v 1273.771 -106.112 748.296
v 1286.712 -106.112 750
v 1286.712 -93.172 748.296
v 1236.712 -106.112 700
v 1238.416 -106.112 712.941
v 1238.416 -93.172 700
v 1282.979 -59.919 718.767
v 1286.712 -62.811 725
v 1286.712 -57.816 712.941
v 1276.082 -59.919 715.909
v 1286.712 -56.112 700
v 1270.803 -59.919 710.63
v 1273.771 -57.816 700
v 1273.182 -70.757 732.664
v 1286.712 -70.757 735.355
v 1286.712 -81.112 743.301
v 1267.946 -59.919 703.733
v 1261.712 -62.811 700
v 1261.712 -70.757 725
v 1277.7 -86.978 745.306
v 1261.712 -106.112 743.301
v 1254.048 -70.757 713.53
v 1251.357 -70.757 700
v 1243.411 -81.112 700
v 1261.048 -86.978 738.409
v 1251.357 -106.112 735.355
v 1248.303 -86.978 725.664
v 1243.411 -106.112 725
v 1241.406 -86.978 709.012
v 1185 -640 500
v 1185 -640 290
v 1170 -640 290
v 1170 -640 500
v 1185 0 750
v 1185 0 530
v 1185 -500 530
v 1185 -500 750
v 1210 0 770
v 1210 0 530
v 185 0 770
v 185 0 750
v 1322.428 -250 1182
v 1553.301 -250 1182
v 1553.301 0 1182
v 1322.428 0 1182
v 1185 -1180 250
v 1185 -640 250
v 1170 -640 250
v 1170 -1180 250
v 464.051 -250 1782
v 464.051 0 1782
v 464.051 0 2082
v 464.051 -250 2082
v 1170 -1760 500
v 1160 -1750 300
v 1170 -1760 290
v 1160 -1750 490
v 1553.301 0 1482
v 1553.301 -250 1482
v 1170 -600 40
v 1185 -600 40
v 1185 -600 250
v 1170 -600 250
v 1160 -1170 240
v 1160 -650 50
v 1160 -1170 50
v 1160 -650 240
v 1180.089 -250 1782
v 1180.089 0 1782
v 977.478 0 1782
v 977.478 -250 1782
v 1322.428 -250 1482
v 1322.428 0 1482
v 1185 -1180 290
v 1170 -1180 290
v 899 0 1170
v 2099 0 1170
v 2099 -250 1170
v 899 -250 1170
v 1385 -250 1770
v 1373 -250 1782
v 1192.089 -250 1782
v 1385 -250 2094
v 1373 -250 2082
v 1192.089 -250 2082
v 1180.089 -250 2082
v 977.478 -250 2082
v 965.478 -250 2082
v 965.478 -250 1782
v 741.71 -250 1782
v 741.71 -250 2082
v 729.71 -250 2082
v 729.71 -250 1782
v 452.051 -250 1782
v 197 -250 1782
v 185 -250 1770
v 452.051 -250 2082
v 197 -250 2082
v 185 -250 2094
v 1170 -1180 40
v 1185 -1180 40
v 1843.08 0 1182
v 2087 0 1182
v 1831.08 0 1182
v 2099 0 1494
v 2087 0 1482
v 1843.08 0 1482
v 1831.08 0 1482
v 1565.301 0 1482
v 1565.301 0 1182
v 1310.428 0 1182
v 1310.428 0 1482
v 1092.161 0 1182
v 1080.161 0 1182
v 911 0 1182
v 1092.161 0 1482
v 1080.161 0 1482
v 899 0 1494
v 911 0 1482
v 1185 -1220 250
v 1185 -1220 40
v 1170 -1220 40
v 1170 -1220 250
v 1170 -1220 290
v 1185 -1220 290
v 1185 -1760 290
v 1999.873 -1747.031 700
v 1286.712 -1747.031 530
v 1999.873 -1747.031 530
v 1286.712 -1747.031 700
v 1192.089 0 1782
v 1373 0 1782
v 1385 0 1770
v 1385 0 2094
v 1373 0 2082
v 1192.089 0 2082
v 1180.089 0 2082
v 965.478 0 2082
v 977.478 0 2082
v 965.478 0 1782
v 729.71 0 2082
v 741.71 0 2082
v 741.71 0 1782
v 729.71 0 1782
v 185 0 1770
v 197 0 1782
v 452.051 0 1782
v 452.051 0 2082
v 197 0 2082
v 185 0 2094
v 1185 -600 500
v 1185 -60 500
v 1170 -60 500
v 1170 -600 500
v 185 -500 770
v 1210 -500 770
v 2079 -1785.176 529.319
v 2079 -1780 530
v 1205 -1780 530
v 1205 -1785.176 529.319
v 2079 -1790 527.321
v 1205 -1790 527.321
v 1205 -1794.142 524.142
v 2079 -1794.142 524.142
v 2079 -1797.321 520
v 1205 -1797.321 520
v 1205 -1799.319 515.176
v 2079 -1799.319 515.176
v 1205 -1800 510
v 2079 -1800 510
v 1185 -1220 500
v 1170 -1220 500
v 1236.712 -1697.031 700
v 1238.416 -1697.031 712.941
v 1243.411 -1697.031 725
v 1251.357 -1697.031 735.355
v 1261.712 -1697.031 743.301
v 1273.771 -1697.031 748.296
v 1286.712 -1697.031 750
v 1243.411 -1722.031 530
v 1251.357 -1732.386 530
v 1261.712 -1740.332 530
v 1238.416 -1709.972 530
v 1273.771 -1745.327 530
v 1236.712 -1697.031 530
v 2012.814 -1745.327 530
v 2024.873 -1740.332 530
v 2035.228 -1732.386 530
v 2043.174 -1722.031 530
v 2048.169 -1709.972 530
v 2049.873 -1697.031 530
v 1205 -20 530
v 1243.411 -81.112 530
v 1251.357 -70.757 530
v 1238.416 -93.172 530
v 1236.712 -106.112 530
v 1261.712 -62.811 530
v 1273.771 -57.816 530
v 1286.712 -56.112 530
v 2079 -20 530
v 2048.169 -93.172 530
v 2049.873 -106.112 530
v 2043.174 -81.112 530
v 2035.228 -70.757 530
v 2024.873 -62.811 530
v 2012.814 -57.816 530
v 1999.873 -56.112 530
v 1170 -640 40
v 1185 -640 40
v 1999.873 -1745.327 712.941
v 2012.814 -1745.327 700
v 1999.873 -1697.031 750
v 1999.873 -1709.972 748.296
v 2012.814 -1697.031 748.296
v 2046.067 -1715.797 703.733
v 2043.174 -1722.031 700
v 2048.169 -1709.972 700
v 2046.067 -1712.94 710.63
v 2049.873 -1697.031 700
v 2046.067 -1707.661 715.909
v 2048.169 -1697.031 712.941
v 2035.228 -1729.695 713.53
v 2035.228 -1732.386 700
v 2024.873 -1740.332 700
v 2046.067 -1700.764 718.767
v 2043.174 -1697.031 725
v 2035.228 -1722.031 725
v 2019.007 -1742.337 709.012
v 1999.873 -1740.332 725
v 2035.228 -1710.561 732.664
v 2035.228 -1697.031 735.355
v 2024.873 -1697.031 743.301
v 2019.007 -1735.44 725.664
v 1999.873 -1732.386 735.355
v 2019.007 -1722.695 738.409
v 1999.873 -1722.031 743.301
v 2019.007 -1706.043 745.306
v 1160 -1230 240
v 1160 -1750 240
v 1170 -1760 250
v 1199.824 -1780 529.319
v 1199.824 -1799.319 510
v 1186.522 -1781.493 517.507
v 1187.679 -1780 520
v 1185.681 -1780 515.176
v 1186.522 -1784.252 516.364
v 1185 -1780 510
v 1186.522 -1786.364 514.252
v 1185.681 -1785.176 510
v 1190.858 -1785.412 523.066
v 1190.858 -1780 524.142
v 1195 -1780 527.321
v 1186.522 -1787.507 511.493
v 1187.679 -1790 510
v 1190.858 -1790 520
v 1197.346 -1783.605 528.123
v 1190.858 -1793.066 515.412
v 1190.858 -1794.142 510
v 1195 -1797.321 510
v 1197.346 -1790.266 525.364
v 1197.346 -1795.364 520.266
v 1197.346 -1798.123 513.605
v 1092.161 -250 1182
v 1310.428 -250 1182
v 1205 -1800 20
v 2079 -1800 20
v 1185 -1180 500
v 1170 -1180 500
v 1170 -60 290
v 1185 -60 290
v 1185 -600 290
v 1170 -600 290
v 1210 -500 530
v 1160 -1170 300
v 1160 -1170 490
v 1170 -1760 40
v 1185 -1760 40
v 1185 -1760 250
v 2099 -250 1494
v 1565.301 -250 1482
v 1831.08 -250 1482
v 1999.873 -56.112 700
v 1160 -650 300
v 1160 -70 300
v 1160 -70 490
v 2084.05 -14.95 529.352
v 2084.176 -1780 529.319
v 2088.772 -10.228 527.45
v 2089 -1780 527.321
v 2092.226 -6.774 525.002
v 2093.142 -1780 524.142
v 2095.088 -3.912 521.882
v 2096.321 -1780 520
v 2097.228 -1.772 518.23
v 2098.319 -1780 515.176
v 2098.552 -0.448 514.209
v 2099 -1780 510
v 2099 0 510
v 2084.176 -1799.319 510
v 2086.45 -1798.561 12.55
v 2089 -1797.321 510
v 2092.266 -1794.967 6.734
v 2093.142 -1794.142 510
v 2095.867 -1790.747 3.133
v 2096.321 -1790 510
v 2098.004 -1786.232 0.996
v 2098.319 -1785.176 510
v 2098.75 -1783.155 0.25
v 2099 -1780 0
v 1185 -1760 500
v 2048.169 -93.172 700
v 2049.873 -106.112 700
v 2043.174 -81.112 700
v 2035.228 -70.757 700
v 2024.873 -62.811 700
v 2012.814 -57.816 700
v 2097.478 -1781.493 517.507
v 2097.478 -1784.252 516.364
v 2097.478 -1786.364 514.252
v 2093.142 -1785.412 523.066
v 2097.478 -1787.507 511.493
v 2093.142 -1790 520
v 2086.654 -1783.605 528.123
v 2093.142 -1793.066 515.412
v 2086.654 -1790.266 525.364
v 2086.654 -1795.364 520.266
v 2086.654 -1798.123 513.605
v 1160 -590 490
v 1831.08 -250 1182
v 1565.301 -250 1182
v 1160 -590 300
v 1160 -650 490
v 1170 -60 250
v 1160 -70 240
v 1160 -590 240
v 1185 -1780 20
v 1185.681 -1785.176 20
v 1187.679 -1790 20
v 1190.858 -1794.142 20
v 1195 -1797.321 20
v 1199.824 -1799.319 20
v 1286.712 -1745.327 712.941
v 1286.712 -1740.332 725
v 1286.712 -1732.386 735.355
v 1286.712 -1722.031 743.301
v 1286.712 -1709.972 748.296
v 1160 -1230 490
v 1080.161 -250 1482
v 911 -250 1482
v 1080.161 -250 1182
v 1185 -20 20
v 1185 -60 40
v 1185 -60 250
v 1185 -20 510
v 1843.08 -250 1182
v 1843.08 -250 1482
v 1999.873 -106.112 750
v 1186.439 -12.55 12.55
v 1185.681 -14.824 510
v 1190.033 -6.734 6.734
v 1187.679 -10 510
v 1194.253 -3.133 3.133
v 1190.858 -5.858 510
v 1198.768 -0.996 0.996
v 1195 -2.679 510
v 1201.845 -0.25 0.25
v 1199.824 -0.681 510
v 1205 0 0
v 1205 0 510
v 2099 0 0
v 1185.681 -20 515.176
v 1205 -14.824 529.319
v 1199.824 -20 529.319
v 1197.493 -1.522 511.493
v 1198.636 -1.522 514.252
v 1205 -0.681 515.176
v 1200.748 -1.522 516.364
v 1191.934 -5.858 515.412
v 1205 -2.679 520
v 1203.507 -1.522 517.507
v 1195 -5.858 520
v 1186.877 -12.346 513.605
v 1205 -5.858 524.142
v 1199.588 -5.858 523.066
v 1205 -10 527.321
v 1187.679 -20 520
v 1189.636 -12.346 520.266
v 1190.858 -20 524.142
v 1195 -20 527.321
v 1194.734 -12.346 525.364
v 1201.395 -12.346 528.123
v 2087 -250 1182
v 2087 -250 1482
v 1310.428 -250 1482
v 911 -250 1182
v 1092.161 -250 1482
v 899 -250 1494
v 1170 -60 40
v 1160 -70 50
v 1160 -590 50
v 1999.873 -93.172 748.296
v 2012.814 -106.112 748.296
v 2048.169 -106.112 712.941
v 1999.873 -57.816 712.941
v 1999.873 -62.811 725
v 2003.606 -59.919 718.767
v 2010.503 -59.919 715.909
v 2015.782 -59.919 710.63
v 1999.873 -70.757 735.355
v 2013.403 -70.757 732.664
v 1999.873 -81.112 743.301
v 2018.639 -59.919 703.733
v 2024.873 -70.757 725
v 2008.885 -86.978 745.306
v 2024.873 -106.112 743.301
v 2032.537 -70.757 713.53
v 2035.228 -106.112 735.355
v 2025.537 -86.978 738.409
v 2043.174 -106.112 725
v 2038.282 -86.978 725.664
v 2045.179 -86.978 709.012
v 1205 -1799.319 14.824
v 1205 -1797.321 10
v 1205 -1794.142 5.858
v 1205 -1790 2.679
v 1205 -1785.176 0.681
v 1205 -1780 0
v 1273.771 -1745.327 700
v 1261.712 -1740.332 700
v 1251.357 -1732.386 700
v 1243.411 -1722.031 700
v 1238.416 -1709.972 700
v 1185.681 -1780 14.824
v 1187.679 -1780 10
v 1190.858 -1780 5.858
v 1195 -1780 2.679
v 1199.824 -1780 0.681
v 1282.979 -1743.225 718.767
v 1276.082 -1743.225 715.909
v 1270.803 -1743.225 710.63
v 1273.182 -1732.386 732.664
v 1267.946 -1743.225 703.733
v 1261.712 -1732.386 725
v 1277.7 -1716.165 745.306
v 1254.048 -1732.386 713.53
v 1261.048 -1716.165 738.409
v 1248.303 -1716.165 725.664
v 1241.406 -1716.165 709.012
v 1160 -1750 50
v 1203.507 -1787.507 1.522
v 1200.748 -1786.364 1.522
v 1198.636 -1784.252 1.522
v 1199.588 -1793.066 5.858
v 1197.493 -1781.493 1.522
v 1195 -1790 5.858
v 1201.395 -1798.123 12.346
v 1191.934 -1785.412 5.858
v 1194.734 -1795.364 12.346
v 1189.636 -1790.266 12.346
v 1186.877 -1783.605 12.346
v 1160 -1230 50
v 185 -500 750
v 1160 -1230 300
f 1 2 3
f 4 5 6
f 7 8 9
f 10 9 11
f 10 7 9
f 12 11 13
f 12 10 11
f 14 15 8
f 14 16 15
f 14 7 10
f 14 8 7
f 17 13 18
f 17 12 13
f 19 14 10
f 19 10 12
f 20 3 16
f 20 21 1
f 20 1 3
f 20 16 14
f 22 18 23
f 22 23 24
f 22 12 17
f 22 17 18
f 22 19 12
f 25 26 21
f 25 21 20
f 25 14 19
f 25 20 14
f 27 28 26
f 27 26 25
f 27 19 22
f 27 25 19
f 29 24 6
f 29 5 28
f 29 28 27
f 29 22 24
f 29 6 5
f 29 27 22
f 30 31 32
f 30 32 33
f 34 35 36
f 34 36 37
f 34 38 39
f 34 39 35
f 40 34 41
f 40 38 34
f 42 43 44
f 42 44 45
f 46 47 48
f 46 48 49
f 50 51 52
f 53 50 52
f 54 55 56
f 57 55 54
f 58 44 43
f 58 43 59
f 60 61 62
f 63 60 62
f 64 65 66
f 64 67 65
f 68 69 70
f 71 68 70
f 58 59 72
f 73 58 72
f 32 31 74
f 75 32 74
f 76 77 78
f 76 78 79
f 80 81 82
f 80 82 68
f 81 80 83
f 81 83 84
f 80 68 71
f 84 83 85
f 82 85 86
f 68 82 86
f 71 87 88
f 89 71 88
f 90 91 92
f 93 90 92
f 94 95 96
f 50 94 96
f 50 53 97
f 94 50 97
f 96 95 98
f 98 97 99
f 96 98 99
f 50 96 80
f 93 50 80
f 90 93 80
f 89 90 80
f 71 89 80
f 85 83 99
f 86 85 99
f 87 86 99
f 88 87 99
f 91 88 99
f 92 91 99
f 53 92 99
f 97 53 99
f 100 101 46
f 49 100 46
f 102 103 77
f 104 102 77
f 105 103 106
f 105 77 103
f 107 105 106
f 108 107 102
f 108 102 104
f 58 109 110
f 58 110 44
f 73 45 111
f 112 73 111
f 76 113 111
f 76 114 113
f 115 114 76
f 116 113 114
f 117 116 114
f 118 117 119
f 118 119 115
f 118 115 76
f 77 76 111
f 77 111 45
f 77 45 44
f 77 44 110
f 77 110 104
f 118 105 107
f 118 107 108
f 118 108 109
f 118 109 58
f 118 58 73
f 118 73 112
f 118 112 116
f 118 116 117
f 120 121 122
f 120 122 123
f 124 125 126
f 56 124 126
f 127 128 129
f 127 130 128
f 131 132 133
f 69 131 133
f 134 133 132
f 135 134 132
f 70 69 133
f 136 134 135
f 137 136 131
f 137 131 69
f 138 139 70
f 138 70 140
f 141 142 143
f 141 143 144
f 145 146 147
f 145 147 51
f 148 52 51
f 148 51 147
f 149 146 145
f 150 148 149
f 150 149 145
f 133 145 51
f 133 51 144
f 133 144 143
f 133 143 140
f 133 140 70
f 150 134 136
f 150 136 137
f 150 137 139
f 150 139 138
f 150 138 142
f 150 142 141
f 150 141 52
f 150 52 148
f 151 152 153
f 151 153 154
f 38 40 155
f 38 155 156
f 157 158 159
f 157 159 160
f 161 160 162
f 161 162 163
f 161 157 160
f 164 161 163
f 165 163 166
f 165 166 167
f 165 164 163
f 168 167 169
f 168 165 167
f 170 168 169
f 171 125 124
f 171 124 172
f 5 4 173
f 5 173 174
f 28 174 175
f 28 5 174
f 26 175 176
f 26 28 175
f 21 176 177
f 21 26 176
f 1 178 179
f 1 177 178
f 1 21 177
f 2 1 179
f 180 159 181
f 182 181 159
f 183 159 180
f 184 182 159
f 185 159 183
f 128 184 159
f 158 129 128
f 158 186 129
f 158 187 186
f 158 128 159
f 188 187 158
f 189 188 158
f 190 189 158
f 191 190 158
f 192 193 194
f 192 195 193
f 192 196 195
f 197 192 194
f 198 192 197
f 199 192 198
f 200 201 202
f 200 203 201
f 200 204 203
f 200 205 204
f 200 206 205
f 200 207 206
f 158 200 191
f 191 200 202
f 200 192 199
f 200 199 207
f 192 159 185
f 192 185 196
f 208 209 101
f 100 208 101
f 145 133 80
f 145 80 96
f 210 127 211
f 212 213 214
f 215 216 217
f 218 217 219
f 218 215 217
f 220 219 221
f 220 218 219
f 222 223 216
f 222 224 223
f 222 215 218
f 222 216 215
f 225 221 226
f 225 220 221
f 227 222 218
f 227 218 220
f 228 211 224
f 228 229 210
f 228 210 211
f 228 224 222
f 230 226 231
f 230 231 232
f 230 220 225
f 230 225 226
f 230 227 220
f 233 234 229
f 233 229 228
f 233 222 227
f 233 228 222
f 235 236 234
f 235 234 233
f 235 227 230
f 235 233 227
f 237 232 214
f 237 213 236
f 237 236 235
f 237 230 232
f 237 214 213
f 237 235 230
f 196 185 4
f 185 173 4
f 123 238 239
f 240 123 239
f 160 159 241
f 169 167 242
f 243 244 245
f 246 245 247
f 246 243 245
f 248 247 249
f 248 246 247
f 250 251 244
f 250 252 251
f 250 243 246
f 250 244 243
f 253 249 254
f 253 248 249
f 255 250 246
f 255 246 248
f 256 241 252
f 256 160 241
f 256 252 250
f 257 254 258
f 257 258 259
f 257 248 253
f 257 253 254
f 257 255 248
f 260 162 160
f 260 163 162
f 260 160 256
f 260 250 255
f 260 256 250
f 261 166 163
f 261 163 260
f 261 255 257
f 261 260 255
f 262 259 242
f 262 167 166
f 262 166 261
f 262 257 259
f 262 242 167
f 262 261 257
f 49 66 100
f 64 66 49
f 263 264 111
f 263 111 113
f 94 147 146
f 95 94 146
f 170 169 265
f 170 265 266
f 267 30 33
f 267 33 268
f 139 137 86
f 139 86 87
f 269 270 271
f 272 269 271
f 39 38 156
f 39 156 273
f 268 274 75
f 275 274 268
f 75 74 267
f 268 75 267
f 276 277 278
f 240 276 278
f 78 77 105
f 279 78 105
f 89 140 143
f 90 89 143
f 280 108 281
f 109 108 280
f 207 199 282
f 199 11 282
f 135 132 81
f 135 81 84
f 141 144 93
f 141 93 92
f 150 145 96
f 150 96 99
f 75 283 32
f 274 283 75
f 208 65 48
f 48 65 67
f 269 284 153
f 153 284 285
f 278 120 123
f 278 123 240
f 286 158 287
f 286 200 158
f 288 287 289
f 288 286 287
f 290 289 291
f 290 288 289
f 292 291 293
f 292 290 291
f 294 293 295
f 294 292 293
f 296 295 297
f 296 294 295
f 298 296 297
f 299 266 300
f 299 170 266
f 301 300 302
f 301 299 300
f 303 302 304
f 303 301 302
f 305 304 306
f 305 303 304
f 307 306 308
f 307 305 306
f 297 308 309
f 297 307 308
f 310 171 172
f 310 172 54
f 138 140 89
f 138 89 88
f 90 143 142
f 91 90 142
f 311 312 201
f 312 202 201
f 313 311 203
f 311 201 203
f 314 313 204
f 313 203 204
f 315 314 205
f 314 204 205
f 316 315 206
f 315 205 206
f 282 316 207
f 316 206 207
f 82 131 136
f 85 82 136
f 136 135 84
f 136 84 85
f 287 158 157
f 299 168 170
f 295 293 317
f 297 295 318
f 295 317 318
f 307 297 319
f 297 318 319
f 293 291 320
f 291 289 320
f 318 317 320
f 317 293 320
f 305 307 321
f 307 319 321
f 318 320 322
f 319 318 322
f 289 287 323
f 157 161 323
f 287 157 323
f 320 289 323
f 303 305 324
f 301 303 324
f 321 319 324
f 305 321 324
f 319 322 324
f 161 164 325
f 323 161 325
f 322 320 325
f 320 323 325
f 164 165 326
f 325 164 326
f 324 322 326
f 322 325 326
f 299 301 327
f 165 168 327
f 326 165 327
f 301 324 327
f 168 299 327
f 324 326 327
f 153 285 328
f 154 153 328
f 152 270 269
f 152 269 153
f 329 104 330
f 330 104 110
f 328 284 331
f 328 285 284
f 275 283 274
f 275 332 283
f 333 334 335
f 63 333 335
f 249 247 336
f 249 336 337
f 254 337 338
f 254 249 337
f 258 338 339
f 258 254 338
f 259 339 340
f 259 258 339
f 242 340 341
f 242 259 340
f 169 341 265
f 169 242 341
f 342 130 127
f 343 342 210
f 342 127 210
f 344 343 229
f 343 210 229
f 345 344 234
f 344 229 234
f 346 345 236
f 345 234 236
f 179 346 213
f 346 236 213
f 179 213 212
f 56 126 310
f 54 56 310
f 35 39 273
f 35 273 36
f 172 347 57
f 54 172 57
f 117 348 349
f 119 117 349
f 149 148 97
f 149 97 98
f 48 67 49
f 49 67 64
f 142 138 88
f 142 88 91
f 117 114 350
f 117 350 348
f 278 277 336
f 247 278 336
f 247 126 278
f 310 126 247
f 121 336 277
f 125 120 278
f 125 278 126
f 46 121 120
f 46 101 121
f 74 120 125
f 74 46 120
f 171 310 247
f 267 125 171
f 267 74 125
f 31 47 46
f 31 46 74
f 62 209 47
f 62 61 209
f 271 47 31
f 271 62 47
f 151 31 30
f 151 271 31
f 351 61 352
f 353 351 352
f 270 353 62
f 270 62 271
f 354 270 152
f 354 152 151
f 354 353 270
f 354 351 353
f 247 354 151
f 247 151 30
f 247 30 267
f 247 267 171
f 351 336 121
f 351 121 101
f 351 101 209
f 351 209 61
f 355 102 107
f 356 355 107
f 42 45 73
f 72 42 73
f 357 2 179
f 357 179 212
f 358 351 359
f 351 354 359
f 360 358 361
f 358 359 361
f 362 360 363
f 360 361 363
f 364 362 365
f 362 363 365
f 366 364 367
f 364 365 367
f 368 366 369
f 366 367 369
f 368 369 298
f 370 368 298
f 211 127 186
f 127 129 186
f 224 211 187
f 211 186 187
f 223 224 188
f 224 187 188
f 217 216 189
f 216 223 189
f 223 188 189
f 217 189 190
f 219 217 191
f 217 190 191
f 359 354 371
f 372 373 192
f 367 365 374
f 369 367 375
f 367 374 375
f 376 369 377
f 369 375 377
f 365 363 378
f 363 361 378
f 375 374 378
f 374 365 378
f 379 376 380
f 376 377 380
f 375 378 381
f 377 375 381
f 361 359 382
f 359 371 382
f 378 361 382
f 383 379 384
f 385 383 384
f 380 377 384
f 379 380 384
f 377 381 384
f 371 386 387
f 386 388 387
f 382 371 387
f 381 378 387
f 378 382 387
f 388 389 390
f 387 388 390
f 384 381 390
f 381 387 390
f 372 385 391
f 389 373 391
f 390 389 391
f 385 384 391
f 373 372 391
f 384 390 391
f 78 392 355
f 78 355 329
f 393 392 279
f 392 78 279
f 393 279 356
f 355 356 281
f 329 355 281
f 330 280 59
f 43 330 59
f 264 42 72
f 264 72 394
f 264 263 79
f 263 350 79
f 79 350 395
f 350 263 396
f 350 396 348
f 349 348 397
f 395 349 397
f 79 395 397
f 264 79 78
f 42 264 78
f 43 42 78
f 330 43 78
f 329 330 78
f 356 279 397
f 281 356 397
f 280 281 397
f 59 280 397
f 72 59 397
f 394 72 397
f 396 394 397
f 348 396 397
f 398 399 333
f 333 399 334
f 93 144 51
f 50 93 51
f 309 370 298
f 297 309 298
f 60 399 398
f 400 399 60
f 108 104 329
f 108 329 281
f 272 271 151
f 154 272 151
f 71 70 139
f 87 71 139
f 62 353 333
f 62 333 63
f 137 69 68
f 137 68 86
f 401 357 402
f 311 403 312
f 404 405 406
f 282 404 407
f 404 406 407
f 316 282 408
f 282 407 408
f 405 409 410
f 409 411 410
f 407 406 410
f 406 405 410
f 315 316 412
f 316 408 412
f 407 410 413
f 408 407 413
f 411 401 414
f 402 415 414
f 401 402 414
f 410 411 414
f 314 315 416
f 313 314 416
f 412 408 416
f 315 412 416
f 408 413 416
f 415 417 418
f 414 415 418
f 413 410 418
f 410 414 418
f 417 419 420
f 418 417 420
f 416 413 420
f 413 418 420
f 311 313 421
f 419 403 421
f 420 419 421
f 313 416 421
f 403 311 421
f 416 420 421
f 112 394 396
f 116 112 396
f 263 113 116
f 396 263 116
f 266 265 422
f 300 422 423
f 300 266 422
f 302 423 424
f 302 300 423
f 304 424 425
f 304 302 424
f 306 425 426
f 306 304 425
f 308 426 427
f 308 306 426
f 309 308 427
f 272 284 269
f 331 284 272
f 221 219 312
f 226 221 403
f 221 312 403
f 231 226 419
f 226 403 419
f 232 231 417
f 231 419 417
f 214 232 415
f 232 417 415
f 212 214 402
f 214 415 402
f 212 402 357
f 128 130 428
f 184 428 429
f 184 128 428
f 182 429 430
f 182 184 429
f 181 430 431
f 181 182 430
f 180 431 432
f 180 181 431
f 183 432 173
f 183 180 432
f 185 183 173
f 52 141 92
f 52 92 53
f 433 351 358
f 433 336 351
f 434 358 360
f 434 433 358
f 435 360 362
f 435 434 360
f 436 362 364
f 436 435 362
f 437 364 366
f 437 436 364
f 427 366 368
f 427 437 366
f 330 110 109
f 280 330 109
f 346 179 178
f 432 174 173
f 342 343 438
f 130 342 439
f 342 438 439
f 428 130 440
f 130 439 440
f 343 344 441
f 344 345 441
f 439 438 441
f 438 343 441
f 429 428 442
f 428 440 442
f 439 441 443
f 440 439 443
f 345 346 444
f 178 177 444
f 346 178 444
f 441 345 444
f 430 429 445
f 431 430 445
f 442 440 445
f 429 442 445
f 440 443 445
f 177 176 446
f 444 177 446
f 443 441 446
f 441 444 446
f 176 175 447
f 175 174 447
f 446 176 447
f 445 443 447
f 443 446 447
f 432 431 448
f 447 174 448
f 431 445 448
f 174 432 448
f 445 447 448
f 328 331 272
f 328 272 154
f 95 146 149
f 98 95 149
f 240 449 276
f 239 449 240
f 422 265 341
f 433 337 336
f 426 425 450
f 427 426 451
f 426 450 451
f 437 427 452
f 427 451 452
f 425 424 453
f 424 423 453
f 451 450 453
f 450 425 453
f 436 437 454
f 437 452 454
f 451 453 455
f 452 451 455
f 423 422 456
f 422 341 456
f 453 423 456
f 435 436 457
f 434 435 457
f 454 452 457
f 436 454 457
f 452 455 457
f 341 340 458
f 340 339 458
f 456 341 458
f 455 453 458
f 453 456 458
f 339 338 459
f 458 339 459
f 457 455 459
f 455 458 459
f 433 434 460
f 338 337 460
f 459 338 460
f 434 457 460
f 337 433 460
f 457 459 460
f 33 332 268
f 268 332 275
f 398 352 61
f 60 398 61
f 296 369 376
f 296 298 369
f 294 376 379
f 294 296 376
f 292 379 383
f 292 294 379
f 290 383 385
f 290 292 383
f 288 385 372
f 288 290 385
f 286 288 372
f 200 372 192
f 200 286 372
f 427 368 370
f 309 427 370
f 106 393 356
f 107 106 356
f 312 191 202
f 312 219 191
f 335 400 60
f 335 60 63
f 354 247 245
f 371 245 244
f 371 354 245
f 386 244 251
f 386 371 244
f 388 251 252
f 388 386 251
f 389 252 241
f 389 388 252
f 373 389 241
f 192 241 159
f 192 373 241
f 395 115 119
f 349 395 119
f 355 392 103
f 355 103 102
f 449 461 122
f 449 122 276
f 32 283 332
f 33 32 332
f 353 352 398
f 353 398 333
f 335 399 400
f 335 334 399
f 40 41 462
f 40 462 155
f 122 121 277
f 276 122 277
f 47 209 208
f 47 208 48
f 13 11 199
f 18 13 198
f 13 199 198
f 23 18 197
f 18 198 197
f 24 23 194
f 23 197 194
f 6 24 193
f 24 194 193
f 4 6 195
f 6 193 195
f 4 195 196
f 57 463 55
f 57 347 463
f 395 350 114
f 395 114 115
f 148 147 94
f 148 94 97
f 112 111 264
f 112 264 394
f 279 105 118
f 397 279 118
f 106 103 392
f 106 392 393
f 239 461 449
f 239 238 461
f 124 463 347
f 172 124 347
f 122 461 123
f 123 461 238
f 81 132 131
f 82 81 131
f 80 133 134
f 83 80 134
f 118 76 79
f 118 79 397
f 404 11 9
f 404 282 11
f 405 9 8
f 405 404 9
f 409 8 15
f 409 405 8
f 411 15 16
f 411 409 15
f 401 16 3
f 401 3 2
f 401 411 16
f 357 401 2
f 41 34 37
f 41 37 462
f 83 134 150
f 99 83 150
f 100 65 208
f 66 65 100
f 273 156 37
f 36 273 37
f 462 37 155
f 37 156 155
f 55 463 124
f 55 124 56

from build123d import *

# Parameters (mm, degrees)
F0_W      = 914
F0_H      = 750
F1_DEPTH  = 1800
F2_W      = 1000
F2_H      = 20
F3_DEPTH  = 500
F4_W      = 540
F4_H      = 210
F5_DEPTH  = 25
F6_W      = 914
F6_H      = 1800
F6_W_2    = 813.160777092
F6_H_2    = 1690.9182518721
F7_DEPTH  = 220
F8_W      = 1200
F8_H      = 324
F8_W_2    = 243.9199807754
F8_H_2    = 300
F8_W_3    = 265.7794940654
F8_W_4    = 230.8728685812
F8_W_5    = 218.2666818699
F8_W_6    = 169.1609747081
F9_DEPTH  = 250
F8_W_7    = 180.9111001602
F8_W_8    = 202.611290684
F8_W_9    = 223.7679018775
F8_W_10   = 265.6586144133
F8_W_11   = 255.051092865
F10_DEPTH = 25
F11_R     = 20
F12_R     = 50
F13_SIZE  = 10


# Not quite as in the source:
# - a feature names something its author has since deleted; it is built from what else it names


with BuildPart() as f1:
    # F0 (on Front) → F1 (new body)
    with BuildSketch(Plane.XZ):
        with Locations((1642, 375)):
            Rectangle(F0_W, F0_H)
    extrude(amount=F1_DEPTH)

    # F4 (on face) → F5 (join)
    with BuildSketch(Plane(origin=(1185, 0, 0), x_dir=(0, -1, 0), z_dir=(-1, 0, 0))):
        with Locations((1490, 145)):
            Rectangle(F4_W, F4_H)
        with Locations((330, 145)):
            Rectangle(F4_W, F4_H)
        with Locations((910, 145)):
            Rectangle(F4_W, F4_H)
        with Locations((1490, 395)):
            Rectangle(F4_W, F4_H)
        with Locations((330, 395)):
            Rectangle(F4_W, F4_H)
        with Locations((910, 395)):
            Rectangle(F4_W, F4_H)
    extrude(amount=F5_DEPTH)

    # F6 (on face) → F7 (cut)
    with BuildSketch(Plane.XY.offset(750)):
        with Locations((1642, -900)):
            Rectangle(F6_W, F6_H)
        with Locations((1643.2924866676, -901.5716090798)):
            Rectangle(F6_W_2, F6_H_2, mode=Mode.SUBTRACT)
    extrude(amount=-F7_DEPTH, mode=Mode.SUBTRACT)

    # F4 (on face) → F10 (join)
    with BuildSketch(Plane(origin=(1185, 0, 0), x_dir=(0, -1, 0), z_dir=(-1, 0, 0))):
        with Locations((1490, 145)):
            Rectangle(F4_W, F4_H)
        with Locations((330, 145)):
            Rectangle(F4_W, F4_H)
        with Locations((910, 145)):
            Rectangle(F4_W, F4_H)
        with Locations((1490, 395)):
            Rectangle(F4_W, F4_H)
        with Locations((330, 395)):
            Rectangle(F4_W, F4_H)
        with Locations((910, 395)):
            Rectangle(F4_W, F4_H)
    extrude(amount=F10_DEPTH)

    # F11
    f11_edges = [f1.edges().sort_by_distance(p)[0] for p in [
        (1642, -1800, 530),
        (1185, -900, 530),
        (1185, -1800, 265),
        (1185, 0, 265),
        (1642, 0, 530),
        (1642, -1800, 0),
        (1185, -900, 0),
        (2099, -900, 530),
        (2099, -1800, 265),
    ]]
    fillet(f11_edges, radius=F11_R)

    # F12
    f12_edges = [f1.edges().sort_by_distance(p)[0] for p in [
        (1236.712098, -901.571609, 750),
        (1643.292487, -1747.030735, 750),
        (1236.712098, -1747.030735, 640),
        (2049.872875, -1747.030735, 640),
        (2049.872875, -901.571609, 750),
        (1643.292487, -56.112483, 750),
        (2049.872875, -56.112483, 640),
        (1236.712098, -56.112483, 640),
    ]]
    fillet(f12_edges, radius=F12_R)

    # F13
    f13_edges = [f1.edges().sort_by_distance(p)[0] for p in [
        (1160, -330, 290),
        (1160, -600, 395),
        (1160, -330, 500),
        (1160, -60, 395),
        (1160, -910, 290),
        (1160, -1180, 395),
        (1160, -910, 500),
        (1160, -640, 395),
        (1160, -1490, 290),
        (1160, -1760, 395),
        (1160, -1490, 500),
        (1160, -1220, 395),
        (1160, -1490, 40),
        (1160, -1760, 145),
        (1160, -1490, 250),
        (1160, -1220, 145),
        (1160, -910, 40),
        (1160, -1180, 145),
        (1160, -910, 250),
        (1160, -640, 145),
        (1160, -330, 40),
        (1160, -600, 145),
        (1160, -330, 250),
        (1160, -60, 145),
    ]]
    chamfer(f13_edges, length=F13_SIZE)


with BuildPart() as f3:
    # F2 (on face) → F3 (new body)
    with BuildSketch(Plane(origin=(0, 0, 0), x_dir=(-1, 0, 0), z_dir=(0, 1, 0))):
        with Locations((-685, 760)):
            Rectangle(F2_W, F2_H)
        Polygon((-1185, 530), (-1185, 750), (-1185, 770), (-1210, 770), (-1210, 530), align=None)
    extrude(amount=-F3_DEPTH)


with BuildPart() as f9:
    # F8 (on face) → F9 (new body)
    with BuildSketch(Plane(origin=(0, 0, 0), x_dir=(-1, 0, 0), z_dir=(0, 1, 0))):
        with Locations((-1499, 1332)):
            Rectangle(F8_W, F8_H)
        with Locations((-1965.0400096123, 1332)):
            Rectangle(F8_W_2, F8_H_2, mode=Mode.SUBTRACT)
        with Locations((-1698.1902721919, 1332)):
            Rectangle(F8_W_3, F8_H_2, mode=Mode.SUBTRACT)
        with Locations((-1437.8640908686, 1332)):
            Rectangle(F8_W_4, F8_H_2, mode=Mode.SUBTRACT)
        with Locations((-1201.294315643, 1332)):
            Rectangle(F8_W_5, F8_H_2, mode=Mode.SUBTRACT)
        with Locations((-995.580487354, 1332)):
            Rectangle(F8_W_6, F8_H_2, mode=Mode.SUBTRACT)
    extrude(amount=-F9_DEPTH)


with BuildPart() as f9b:
    # F8 (on face) → F9, piece 2 (new body)
    with BuildSketch(Plane(origin=(0, 0, 0), x_dir=(-1, 0, 0), z_dir=(0, 1, 0))):
        with Locations((-785, 1932)):
            Rectangle(F8_W, F8_H)
        with Locations((-1282.5444499199, 1932)):
            Rectangle(F8_W_7, F8_H_2, mode=Mode.SUBTRACT)
        with Locations((-1078.7832544978, 1932)):
            Rectangle(F8_W_8, F8_H_2, mode=Mode.SUBTRACT)
        with Locations((-853.5936582171, 1932)):
            Rectangle(F8_W_9, F8_H_2, mode=Mode.SUBTRACT)
        with Locations((-596.8804000716, 1932)):
            Rectangle(F8_W_10, F8_H_2, mode=Mode.SUBTRACT)
        with Locations((-324.5255464325, 1932)):
            Rectangle(F8_W_11, F8_H_2, mode=Mode.SUBTRACT)
    extrude(amount=-F9_DEPTH)


solid = Compound([f1.part, f3.part, f9.part, f9b.part])
